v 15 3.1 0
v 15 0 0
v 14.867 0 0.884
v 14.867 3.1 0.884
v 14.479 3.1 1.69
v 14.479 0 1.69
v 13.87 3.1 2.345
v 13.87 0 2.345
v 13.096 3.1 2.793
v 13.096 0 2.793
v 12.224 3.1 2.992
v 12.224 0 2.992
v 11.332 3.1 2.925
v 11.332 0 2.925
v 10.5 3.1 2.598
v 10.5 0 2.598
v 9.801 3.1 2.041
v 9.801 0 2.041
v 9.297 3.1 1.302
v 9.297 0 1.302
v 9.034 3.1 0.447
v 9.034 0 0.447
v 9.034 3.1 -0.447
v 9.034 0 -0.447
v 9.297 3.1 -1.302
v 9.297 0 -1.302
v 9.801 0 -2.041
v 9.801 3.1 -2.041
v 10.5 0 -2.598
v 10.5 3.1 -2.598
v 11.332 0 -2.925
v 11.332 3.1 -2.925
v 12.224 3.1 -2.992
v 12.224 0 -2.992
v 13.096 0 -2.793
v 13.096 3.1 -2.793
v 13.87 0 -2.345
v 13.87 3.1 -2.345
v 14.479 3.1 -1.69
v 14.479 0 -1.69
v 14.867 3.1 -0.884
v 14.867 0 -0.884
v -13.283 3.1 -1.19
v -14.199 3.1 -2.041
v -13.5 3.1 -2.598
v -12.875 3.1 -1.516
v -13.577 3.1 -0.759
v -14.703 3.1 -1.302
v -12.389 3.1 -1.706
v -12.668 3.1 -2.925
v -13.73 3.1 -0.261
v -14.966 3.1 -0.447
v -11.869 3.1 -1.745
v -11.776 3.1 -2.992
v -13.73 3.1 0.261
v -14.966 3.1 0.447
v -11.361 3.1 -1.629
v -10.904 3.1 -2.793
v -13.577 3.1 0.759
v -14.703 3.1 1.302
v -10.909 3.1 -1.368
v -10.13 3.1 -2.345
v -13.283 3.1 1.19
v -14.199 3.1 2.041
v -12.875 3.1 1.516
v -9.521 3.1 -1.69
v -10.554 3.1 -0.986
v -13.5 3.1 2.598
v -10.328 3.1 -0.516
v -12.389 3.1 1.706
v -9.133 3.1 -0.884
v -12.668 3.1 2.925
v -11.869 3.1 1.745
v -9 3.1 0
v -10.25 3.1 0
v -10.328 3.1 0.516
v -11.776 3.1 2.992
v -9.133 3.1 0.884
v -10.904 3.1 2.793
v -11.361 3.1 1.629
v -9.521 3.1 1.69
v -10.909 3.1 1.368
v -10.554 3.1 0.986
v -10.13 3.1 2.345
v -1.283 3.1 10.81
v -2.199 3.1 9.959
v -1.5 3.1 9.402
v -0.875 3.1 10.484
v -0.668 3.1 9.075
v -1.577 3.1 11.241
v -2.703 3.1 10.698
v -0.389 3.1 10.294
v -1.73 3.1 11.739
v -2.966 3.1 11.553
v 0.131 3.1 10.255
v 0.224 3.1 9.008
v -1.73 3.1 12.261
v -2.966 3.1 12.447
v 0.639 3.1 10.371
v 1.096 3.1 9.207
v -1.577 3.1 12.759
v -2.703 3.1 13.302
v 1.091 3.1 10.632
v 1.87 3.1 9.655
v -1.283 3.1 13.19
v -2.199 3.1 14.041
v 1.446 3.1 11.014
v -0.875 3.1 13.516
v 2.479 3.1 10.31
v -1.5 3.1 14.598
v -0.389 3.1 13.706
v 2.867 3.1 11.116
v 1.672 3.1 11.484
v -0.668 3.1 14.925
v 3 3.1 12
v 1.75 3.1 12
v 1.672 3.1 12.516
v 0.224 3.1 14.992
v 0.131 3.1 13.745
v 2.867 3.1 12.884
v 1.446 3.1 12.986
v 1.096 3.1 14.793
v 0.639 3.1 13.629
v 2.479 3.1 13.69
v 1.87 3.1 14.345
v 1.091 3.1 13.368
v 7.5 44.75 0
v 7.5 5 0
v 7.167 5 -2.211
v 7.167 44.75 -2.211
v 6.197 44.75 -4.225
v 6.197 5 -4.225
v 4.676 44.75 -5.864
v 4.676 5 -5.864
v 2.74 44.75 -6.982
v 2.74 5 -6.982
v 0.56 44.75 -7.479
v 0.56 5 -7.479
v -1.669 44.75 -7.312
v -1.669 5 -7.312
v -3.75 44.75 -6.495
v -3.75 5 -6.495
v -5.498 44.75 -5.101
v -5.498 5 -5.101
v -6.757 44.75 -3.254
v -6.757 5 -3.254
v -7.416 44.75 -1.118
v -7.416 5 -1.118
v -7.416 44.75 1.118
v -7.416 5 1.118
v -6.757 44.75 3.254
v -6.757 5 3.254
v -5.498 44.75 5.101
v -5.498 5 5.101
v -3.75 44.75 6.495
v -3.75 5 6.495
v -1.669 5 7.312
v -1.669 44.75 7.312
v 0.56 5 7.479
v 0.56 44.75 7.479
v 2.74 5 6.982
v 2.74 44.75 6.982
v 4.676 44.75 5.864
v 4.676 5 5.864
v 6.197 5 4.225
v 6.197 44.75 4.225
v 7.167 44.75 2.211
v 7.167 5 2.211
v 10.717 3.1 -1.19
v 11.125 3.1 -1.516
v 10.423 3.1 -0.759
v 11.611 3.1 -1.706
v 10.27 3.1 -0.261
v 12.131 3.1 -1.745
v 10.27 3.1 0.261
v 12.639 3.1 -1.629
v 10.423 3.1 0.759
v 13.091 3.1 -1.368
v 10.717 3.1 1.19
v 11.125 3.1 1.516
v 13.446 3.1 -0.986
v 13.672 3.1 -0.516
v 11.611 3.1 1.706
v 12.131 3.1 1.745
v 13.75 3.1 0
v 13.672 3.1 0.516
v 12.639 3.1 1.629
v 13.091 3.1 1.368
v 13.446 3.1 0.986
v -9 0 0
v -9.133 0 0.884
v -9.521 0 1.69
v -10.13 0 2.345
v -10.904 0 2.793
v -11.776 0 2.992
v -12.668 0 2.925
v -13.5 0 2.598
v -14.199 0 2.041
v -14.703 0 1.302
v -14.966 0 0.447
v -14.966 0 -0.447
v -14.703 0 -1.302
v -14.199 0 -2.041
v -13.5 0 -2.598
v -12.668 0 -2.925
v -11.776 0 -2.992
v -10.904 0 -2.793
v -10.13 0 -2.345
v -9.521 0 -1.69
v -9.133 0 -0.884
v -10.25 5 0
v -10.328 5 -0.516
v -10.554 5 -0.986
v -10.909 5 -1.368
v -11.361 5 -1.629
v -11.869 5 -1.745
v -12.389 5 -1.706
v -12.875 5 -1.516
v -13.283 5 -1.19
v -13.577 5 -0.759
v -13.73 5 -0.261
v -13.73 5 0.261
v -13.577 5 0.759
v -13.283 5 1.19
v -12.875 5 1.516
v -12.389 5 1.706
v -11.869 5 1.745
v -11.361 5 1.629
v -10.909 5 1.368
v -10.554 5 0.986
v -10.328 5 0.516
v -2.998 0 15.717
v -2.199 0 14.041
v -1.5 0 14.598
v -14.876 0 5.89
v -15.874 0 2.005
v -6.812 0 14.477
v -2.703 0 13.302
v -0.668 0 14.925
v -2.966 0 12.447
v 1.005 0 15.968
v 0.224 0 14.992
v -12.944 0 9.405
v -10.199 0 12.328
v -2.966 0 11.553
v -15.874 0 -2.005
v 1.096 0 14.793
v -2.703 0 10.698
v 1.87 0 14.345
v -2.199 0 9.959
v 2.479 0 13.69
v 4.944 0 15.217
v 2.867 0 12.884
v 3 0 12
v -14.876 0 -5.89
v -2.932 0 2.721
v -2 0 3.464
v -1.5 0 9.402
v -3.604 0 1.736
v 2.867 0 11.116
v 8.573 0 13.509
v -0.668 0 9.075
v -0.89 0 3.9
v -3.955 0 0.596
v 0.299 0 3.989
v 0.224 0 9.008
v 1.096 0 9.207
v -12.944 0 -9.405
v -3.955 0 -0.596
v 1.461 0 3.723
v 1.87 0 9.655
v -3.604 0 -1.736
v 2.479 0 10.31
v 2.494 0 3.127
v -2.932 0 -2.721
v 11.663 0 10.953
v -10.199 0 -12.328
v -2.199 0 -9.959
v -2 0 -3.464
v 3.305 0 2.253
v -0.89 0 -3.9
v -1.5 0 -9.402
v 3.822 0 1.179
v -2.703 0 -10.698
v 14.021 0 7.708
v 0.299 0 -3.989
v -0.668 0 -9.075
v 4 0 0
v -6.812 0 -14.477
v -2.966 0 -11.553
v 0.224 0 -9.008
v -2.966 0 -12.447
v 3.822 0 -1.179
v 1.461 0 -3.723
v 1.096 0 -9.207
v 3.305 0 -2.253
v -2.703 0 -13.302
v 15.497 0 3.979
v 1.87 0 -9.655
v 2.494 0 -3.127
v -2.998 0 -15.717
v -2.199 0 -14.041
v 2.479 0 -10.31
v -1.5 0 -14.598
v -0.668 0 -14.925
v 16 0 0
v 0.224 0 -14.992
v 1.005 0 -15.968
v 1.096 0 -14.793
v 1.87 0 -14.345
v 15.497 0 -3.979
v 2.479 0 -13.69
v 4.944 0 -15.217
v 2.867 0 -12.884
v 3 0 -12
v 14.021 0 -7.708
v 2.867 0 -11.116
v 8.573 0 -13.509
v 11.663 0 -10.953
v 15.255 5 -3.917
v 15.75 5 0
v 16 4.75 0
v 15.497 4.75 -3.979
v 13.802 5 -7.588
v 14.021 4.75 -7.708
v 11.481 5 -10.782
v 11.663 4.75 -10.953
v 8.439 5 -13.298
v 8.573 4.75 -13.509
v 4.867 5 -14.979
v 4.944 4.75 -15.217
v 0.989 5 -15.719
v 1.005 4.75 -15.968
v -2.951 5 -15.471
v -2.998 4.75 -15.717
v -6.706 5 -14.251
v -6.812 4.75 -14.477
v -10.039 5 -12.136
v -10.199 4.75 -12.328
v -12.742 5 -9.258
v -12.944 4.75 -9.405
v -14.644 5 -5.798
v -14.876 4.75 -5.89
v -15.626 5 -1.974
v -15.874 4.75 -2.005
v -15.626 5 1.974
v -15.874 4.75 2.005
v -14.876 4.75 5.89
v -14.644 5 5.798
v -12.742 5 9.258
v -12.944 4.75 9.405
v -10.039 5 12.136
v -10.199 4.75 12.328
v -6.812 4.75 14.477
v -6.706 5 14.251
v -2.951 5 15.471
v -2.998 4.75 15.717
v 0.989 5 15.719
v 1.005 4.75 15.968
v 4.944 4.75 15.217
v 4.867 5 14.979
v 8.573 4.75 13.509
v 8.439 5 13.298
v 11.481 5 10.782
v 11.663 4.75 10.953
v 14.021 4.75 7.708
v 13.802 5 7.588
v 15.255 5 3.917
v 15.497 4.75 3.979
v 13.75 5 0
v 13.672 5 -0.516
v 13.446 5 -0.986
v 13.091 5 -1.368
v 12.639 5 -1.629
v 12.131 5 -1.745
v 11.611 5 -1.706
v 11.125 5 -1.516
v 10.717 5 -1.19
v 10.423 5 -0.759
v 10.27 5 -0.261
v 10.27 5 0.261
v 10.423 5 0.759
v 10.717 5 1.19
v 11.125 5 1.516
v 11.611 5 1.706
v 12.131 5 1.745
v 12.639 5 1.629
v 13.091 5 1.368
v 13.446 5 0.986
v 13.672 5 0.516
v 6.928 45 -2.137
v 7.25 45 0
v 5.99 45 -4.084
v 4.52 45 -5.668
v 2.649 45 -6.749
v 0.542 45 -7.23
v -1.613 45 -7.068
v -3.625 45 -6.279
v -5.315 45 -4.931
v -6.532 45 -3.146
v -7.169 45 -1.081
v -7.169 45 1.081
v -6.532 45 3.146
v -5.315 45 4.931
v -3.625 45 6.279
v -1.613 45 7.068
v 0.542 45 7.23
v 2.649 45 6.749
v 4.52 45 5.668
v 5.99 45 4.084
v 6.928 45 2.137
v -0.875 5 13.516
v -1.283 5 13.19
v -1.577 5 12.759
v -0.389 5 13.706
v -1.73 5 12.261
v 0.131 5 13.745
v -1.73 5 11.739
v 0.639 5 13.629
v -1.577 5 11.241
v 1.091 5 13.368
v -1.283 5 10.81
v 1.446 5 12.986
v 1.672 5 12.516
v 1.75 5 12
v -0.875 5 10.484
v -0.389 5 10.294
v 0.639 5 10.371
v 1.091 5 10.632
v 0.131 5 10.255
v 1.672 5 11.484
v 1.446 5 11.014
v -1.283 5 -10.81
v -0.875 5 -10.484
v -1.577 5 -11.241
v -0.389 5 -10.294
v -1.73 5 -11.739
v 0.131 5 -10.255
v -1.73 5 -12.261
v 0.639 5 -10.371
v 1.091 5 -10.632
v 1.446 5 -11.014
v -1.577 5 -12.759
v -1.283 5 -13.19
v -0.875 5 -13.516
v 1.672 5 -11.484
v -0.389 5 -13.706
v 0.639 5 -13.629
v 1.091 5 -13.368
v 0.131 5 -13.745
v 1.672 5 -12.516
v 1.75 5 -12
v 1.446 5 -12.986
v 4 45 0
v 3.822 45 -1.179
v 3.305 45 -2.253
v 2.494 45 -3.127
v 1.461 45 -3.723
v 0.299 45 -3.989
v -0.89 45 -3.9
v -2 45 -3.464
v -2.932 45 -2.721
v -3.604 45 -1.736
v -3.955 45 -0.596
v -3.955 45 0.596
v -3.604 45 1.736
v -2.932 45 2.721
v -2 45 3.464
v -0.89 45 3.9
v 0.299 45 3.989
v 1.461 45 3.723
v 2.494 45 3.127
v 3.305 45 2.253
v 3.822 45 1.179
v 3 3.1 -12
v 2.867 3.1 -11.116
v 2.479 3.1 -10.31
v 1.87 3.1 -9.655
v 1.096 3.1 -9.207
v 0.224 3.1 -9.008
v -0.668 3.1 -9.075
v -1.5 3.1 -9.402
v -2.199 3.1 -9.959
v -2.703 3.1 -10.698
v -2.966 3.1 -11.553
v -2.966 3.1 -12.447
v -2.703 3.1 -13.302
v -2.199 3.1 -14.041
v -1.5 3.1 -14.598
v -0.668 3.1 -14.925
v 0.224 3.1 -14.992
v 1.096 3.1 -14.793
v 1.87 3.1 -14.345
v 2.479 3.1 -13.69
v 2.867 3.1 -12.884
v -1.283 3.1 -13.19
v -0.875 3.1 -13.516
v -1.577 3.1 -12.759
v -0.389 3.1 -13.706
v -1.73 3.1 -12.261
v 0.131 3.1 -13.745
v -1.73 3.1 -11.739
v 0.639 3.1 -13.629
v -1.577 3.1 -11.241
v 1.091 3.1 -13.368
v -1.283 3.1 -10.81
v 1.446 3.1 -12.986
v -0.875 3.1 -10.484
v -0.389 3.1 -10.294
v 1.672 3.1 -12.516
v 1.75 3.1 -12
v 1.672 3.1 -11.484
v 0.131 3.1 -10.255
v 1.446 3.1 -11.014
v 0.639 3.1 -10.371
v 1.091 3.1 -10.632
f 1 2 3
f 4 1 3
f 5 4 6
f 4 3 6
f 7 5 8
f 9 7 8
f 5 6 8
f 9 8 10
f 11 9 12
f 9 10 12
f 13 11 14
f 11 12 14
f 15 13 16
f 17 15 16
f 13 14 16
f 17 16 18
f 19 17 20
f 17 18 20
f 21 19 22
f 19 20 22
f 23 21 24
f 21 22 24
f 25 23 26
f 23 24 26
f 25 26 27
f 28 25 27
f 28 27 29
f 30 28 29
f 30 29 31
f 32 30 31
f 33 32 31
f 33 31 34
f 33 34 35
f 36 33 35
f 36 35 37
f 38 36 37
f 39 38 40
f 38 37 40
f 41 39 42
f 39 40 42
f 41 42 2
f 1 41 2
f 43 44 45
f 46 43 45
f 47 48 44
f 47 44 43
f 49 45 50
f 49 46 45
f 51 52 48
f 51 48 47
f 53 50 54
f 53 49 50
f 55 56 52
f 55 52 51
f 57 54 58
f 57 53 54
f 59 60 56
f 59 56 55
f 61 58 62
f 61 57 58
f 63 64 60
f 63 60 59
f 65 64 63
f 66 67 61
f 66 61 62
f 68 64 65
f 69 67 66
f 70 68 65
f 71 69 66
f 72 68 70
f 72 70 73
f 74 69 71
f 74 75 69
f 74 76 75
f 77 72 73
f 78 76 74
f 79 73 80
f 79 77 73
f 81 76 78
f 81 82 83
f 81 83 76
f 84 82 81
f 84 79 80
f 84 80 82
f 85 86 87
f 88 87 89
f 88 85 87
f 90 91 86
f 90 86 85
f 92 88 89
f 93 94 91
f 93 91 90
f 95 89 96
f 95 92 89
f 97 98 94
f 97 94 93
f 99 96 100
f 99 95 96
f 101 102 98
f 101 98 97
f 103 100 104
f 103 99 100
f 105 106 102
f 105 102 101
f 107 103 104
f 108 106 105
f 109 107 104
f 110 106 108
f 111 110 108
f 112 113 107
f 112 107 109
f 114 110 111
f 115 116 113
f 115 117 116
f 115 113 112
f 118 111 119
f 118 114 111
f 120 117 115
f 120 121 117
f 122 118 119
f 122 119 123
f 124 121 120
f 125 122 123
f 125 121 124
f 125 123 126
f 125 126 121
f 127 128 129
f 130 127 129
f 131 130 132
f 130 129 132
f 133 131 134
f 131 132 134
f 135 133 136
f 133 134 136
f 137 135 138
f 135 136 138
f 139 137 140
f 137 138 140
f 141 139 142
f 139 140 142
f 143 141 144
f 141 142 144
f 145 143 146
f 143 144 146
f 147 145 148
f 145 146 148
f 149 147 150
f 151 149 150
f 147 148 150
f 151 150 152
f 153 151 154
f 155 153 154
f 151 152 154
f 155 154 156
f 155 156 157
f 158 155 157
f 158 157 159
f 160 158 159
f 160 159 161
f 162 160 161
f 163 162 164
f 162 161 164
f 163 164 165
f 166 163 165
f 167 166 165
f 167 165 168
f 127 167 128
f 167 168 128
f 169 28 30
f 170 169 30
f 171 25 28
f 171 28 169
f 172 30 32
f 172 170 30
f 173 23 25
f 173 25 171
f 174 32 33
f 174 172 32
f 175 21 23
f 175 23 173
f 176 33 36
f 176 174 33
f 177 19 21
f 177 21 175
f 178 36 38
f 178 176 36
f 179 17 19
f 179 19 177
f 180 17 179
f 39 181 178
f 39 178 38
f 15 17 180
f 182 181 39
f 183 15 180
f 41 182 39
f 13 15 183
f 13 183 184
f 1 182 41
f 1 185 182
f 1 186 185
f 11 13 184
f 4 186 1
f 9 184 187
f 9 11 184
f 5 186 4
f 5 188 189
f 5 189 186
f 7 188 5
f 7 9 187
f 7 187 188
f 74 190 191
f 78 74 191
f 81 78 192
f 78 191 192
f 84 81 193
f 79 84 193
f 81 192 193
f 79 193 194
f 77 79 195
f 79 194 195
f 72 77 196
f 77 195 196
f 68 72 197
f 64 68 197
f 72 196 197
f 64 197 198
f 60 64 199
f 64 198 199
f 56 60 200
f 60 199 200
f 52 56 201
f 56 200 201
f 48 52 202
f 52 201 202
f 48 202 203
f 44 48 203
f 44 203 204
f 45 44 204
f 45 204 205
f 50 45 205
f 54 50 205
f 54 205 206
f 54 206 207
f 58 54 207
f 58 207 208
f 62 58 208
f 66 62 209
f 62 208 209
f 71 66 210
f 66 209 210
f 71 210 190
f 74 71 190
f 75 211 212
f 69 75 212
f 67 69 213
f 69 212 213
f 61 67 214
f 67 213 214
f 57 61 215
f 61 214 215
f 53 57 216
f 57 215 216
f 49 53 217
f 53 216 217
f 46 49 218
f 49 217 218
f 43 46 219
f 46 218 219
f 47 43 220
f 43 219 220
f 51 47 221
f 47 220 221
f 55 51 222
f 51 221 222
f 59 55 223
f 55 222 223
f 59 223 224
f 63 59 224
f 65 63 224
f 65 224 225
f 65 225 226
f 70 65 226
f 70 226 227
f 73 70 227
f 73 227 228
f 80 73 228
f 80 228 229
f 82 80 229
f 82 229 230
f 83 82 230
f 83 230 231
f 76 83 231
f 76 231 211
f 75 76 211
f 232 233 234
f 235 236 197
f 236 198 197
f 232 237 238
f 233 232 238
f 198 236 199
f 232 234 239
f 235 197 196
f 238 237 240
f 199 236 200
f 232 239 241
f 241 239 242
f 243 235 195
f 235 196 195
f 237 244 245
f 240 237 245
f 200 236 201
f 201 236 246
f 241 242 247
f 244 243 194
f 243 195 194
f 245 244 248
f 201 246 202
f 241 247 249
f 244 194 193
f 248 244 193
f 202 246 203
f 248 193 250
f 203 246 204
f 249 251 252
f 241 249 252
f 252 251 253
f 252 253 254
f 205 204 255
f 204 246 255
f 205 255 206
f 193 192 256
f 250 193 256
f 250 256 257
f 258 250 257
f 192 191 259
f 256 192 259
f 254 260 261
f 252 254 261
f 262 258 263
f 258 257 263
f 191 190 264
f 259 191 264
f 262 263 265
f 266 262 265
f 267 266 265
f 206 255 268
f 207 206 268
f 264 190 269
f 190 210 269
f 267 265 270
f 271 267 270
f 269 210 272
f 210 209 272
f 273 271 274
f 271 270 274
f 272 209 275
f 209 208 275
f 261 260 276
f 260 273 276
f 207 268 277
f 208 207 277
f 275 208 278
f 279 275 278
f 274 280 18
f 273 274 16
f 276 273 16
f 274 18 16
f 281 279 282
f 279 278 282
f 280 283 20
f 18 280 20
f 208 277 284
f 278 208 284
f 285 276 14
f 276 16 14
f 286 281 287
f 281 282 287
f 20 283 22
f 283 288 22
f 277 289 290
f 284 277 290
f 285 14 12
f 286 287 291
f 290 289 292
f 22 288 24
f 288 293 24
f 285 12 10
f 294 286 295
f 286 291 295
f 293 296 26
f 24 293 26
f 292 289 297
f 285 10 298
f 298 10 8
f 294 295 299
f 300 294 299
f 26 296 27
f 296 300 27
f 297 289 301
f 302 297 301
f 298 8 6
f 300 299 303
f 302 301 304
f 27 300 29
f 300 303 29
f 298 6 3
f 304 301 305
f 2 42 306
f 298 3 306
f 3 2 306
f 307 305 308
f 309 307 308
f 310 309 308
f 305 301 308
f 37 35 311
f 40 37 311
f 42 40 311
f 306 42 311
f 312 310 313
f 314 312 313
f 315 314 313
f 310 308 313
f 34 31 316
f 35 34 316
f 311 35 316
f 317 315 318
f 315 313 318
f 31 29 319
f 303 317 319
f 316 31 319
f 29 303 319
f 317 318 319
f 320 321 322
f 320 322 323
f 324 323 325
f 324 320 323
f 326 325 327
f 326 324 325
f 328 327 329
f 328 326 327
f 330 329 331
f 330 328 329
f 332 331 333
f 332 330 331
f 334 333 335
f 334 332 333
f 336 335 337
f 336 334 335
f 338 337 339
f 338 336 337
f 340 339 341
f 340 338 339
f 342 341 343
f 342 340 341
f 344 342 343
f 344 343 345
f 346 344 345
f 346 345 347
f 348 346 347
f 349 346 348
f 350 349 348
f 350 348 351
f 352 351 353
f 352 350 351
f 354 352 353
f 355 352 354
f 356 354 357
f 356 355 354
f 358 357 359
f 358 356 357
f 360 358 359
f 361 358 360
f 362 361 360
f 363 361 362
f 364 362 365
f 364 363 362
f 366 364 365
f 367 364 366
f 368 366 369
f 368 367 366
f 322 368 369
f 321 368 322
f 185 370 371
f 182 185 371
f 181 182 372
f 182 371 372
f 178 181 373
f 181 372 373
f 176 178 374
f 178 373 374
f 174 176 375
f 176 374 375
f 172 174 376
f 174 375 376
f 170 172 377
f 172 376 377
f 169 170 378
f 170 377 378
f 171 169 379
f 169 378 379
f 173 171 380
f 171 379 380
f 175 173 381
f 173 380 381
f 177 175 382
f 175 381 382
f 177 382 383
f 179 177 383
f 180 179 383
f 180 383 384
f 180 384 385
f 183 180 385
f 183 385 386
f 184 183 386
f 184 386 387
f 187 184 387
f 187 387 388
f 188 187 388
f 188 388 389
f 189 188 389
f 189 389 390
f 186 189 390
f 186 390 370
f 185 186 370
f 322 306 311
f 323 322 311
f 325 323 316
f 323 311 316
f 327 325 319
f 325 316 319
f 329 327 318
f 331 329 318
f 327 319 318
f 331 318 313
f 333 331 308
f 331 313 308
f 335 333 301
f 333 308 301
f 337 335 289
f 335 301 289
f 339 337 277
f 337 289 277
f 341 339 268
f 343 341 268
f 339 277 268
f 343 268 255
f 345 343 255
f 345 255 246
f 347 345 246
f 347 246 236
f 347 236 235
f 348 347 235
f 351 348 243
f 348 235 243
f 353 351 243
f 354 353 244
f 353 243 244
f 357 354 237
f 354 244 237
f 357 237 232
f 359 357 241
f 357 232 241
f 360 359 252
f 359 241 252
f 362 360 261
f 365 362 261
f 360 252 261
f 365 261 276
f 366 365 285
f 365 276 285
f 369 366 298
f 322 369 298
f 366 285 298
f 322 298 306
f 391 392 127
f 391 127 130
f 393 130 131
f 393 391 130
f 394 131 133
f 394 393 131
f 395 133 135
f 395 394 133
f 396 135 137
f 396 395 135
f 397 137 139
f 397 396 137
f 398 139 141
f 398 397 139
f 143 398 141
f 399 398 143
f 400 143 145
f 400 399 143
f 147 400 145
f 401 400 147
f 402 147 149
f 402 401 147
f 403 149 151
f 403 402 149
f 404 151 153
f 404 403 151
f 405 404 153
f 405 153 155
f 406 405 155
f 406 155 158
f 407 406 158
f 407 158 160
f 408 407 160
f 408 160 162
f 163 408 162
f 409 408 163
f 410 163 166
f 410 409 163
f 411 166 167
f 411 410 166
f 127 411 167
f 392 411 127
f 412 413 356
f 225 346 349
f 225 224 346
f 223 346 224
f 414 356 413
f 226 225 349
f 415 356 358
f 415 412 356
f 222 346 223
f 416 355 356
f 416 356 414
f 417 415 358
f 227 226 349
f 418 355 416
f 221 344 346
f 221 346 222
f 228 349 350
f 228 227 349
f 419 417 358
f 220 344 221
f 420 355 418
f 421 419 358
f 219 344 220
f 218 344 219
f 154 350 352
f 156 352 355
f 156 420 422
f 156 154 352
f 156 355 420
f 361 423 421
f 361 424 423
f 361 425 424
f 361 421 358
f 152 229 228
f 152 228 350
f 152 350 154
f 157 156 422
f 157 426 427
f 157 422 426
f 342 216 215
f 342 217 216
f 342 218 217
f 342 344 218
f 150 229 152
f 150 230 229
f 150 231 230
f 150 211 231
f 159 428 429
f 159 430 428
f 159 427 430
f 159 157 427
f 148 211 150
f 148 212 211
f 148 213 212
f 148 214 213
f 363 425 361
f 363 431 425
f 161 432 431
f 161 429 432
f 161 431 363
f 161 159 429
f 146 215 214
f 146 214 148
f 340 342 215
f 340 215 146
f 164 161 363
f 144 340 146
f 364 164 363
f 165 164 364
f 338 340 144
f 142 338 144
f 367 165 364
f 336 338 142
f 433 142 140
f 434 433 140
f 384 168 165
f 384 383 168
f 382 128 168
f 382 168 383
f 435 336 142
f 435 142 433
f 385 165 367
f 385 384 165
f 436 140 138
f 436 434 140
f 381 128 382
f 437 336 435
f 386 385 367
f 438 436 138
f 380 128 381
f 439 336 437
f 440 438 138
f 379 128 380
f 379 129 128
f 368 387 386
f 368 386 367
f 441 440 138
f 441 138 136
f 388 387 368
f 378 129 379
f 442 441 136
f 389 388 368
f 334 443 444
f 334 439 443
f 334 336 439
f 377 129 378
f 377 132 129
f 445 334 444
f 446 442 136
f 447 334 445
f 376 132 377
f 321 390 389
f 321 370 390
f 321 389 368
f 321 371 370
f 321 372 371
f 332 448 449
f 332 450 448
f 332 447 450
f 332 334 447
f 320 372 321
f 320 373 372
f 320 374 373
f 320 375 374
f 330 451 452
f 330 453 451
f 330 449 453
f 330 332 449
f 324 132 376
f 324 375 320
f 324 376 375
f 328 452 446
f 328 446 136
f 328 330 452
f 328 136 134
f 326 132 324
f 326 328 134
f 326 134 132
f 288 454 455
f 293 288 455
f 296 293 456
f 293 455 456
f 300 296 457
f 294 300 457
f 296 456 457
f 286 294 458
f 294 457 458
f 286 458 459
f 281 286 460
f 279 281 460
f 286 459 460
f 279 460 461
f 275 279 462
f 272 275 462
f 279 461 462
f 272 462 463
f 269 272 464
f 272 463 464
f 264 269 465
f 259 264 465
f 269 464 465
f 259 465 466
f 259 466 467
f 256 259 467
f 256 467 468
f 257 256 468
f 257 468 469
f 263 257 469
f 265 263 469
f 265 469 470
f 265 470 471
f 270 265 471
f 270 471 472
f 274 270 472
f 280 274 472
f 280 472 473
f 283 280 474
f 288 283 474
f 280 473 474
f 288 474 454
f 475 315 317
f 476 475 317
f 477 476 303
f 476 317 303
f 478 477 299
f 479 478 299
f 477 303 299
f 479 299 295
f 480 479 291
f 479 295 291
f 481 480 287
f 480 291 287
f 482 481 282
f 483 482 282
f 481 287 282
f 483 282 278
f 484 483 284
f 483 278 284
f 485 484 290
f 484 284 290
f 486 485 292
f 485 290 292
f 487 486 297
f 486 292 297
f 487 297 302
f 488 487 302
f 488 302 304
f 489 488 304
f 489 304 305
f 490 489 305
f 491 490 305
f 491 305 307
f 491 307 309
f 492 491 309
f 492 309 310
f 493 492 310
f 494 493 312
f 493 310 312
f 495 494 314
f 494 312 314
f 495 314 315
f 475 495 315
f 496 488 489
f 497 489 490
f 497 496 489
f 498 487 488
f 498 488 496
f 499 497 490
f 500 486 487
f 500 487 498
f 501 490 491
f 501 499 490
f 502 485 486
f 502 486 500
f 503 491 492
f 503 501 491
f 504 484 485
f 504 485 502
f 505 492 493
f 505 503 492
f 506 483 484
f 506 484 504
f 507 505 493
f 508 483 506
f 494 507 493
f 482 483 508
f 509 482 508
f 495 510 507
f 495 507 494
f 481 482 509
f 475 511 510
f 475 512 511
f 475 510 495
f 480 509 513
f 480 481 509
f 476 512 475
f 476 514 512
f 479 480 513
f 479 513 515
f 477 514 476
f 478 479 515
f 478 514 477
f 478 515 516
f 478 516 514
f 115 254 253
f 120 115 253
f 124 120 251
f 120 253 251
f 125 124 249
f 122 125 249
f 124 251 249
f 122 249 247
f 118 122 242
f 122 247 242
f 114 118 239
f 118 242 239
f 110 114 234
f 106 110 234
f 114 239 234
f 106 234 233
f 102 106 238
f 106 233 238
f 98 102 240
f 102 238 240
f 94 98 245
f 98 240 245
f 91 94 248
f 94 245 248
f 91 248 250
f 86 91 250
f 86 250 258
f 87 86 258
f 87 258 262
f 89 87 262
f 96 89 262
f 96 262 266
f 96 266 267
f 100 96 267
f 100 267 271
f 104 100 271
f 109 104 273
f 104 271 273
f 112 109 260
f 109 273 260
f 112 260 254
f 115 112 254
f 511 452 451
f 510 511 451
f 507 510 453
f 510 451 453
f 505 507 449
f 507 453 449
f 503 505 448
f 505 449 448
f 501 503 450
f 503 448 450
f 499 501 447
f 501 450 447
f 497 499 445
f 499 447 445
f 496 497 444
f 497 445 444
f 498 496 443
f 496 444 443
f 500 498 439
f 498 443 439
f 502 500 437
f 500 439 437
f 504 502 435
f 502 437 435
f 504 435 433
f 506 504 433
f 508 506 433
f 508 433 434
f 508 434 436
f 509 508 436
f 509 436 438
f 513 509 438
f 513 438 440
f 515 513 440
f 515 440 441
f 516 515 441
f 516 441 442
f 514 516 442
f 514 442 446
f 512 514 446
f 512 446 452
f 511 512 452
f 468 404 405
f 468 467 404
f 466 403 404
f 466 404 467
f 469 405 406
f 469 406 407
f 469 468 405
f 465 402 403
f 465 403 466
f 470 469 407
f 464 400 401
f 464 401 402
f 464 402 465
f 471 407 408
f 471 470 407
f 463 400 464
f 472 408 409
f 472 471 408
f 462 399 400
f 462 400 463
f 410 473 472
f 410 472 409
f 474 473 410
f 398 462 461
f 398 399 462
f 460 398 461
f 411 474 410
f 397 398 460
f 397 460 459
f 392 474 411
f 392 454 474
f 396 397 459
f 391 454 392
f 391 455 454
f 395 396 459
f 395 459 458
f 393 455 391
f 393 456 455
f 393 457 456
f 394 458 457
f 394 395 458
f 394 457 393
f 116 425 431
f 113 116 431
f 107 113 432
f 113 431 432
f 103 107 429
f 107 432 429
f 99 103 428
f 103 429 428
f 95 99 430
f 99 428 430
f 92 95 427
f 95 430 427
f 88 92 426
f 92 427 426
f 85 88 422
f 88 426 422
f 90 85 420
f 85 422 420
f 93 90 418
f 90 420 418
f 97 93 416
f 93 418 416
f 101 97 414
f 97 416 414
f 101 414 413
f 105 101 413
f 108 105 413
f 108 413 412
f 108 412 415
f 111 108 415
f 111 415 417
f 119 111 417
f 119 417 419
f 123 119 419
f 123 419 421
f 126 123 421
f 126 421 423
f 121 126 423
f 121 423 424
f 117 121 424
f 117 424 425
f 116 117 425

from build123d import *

# Parameters (mm, degrees)
SKETCH1_R           = 16
BOSS_EXTRUDE3_DEPTH = 5
SKETCH4_R           = 7.5
BOSS_EXTRUDE4_DEPTH = 40
SKETCH5_R           = 1.75
CUT_EXTRUDE2_DEPTH  = 5
SKETCH6_R           = 4
CUT_EXTRUDE3_DEPTH  = 45
SKETCH7_R           = 3
CUT_EXTRUDE4_DEPTH  = 3.1
CHAMFER1_SIZE       = 0.25


with BuildPart() as part:
    # Sketch1 → Boss-Extrude3 (new body)
    with BuildSketch(Plane(origin=(0, 0, 0), x_dir=(1, 0, 0), z_dir=(0, 1, 0))):
        Circle(SKETCH1_R)
    extrude(amount=BOSS_EXTRUDE3_DEPTH)

    # Sketch4 → Boss-Extrude4 (add)
    with BuildSketch(Plane(origin=(0, 5, 0), x_dir=(1, 0, 0), z_dir=(0, 1, 0))):
        Circle(SKETCH4_R)
    extrude(amount=BOSS_EXTRUDE4_DEPTH)

    # Sketch5 → Cut-Extrude2 (cut)
    with BuildSketch(Plane(origin=(0, 5, 0), x_dir=(1, 0, 0), z_dir=(0, 1, 0))):
        with Locations((0, 12)):
            Circle(SKETCH5_R)
        with Locations((-12, 0)):
            Circle(SKETCH5_R)
        with Locations((12, 0)):
            Circle(SKETCH5_R)
        with Locations((0, -12)):
            Circle(SKETCH5_R)
    extrude(amount=-CUT_EXTRUDE2_DEPTH, mode=Mode.SUBTRACT)

    # Sketch6 → Cut-Extrude3 (cut)
    with BuildSketch(Plane(origin=(0, 45, 0), x_dir=(1, 0, 0), z_dir=(0, 1, 0))):
        Circle(SKETCH6_R)
    extrude(amount=-CUT_EXTRUDE3_DEPTH, mode=Mode.SUBTRACT)

    # Sketch7 → Cut-Extrude4 (cut)
    with BuildSketch(Plane.XZ):
        with Locations((0, 12)):
            Circle(SKETCH7_R)
        with Locations((-12, 0)):
            Circle(SKETCH7_R)
        with Locations((0, -12)):
            Circle(SKETCH7_R)
        with Locations((12, 0)):
            Circle(SKETCH7_R)
    extrude(amount=-CUT_EXTRUDE4_DEPTH, mode=Mode.SUBTRACT)

    # Chamfer1
    chamfer1_edges = [part.edges().sort_by_distance(p)[0] for p in [
        (-16, 5, 0),
        (-7.5, 45, 0),
    ]]
    chamfer(chamfer1_edges, length=CHAMFER1_SIZE)


solid = part.part
